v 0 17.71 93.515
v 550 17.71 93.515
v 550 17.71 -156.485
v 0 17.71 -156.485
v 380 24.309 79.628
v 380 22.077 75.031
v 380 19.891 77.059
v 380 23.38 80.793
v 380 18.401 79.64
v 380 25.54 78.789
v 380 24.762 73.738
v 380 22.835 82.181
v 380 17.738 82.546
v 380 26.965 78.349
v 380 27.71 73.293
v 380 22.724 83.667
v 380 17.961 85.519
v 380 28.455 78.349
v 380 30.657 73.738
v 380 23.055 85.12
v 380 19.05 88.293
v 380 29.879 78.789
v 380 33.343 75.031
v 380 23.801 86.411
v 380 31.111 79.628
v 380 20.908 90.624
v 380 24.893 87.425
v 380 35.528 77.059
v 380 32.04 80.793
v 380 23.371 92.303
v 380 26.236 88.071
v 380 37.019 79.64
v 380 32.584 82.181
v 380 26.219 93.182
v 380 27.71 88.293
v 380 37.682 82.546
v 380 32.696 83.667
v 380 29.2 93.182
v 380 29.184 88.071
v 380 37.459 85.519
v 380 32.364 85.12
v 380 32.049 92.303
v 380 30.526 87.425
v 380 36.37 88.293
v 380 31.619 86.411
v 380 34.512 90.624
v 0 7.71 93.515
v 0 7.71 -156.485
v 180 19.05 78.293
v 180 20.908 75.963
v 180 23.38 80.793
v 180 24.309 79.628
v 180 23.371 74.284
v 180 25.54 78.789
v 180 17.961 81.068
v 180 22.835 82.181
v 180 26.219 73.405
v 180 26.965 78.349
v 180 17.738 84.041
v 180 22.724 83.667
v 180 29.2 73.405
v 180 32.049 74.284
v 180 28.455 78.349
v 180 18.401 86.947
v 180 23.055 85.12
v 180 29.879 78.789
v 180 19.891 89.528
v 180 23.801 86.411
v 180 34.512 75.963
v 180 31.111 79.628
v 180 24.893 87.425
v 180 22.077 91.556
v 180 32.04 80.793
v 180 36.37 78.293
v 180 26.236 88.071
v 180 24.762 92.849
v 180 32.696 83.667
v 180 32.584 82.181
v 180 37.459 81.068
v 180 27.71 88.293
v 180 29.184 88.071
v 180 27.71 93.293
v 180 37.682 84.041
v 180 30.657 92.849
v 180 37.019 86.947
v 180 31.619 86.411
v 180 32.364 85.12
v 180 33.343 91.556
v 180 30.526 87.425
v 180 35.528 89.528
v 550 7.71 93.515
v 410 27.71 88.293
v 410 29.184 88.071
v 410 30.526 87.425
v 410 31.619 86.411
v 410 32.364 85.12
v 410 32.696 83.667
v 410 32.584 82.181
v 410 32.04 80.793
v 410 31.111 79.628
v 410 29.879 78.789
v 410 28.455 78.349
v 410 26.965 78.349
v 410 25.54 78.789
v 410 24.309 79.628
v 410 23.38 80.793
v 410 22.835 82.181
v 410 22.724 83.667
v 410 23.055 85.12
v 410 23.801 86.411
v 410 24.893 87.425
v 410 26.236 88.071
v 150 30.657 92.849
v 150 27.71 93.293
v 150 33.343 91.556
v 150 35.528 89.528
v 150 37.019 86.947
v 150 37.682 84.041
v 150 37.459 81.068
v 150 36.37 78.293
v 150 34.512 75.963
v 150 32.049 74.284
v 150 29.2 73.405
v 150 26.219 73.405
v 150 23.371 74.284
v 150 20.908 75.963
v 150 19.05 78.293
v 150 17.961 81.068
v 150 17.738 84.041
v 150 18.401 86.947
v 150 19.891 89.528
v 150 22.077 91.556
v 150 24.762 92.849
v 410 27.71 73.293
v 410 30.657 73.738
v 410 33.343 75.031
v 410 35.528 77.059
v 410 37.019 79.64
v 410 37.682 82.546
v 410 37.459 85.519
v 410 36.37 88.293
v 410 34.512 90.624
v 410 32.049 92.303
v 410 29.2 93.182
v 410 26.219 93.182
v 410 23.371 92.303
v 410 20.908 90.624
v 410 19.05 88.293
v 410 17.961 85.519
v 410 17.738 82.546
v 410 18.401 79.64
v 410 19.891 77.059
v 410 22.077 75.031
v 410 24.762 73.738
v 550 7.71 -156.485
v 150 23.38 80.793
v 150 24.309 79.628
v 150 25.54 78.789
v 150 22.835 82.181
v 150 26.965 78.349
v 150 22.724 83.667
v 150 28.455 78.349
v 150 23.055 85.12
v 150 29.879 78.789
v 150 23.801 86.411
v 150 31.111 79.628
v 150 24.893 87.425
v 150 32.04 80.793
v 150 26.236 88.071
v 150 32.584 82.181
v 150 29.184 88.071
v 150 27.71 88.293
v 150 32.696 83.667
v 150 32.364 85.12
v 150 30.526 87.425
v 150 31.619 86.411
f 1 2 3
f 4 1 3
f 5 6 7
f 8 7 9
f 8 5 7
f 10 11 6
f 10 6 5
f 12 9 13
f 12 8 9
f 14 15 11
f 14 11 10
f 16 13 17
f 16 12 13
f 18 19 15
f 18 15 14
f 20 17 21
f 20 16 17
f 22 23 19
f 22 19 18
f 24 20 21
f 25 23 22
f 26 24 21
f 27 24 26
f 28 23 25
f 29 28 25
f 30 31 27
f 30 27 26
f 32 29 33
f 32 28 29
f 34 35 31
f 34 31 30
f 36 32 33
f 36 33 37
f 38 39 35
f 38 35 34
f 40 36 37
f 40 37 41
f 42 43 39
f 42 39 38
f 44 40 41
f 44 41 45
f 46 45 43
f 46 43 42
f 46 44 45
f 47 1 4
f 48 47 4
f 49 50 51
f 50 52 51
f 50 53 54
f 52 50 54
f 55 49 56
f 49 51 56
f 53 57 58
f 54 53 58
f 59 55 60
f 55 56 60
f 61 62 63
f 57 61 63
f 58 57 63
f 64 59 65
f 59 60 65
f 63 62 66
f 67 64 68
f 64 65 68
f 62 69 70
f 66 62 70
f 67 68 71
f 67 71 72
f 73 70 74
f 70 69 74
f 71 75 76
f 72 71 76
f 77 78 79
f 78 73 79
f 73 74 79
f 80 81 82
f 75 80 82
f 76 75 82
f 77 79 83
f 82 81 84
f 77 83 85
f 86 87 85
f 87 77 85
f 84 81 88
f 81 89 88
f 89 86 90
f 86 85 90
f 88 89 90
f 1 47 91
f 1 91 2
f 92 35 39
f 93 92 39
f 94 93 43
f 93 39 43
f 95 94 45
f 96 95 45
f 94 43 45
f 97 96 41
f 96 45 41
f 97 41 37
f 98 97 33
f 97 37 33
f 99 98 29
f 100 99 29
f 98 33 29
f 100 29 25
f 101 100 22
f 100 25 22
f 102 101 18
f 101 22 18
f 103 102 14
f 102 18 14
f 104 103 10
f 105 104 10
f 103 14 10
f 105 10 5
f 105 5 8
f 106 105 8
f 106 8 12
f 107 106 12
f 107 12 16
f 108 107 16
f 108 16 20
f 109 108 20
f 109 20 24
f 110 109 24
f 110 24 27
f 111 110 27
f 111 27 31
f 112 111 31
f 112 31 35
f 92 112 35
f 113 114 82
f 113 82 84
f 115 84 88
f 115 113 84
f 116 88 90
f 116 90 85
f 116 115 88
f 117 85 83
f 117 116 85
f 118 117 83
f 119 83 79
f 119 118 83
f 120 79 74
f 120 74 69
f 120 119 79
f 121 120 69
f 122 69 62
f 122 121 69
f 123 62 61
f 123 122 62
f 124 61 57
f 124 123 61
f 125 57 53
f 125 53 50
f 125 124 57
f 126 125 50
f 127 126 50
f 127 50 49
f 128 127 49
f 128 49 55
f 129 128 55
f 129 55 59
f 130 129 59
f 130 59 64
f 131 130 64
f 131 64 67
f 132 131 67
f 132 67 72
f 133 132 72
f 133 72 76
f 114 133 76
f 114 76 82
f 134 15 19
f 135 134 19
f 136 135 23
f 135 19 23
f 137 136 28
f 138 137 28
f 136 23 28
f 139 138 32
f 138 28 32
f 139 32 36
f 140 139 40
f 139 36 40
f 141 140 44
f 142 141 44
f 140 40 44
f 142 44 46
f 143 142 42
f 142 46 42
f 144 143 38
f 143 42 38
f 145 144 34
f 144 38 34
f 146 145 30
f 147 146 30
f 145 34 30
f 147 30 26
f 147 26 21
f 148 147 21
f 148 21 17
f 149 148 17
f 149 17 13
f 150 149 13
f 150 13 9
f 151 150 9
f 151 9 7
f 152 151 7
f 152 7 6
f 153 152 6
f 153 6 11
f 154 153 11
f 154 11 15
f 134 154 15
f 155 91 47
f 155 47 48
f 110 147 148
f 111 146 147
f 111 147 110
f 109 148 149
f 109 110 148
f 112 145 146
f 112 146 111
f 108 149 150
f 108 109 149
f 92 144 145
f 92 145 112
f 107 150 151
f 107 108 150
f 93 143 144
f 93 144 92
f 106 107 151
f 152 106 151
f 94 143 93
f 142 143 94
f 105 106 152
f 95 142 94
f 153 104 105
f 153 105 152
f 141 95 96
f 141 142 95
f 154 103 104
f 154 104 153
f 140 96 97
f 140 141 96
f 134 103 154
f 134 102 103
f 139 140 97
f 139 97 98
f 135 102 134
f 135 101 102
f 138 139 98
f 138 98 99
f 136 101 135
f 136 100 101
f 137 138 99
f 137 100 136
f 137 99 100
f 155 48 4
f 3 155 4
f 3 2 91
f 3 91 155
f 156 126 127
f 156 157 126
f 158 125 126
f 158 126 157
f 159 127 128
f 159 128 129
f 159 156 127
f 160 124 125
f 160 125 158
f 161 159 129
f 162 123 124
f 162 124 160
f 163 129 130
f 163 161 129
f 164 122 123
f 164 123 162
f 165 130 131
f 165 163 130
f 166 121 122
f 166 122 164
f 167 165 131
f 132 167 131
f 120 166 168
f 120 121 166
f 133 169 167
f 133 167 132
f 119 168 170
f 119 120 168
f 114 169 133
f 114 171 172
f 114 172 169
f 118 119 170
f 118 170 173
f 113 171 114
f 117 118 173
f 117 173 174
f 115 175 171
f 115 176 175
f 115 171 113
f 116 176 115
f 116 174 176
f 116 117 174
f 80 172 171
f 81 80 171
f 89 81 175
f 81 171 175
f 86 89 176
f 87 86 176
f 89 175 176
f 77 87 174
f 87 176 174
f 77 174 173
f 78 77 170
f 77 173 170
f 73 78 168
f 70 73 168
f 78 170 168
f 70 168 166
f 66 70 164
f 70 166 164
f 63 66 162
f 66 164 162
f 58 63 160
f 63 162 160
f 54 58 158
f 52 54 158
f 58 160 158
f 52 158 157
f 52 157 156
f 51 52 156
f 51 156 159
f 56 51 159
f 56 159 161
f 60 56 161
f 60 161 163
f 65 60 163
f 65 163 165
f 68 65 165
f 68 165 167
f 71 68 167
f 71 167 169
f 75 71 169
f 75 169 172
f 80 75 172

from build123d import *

# Parameters (mm, degrees)
SKETCH1_R             = 10
BOSS_EXTRUDE3_DEPTH   = 550
SKETCH1_W             = 250
SKETCH1_H             = 10
BOSS_EXTRUDE3_2_DEPTH = 550
CUT_EXTRUDE3_START    = -140
SKETCH5_R             = 10
CUT_EXTRUDE3_DEPTH    = 140
SKETCH6_R             = 10
CUT_EXTRUDE4_DEPTH    = 380
SKETCH7_R             = 5
CUT_EXTRUDE5_DEPTH    = 380
SKETCH8_R             = 10
BOSS_EXTRUDE5_DEPTH   = 180
SKETCH10_R            = 10
CUT_EXTRUDE6_DEPTH    = 150
SKETCH11_R            = 5
CUT_EXTRUDE7_DEPTH    = 150


with BuildPart() as part:
    # Sketch1 → Boss-Extrude3 (new body)
    with BuildSketch(Plane(origin=(0, 0, 0), x_dir=(0, 0, -1), z_dir=(1, 0, 0))):
        with Locations((-83.293495175, 27.709808525)):
            Circle(SKETCH1_R)
    extrude(amount=BOSS_EXTRUDE3_DEPTH)

    # Sketch5 → Cut-Extrude3 (cut)
    with BuildSketch(Plane(origin=(550, 0, 0), x_dir=(0, 0, -1), z_dir=(1, 0, 0)).offset(CUT_EXTRUDE3_START)):
        with Locations((-83.293495175, 27.709808525)):
            Circle(SKETCH5_R)
    extrude(amount=CUT_EXTRUDE3_DEPTH, mode=Mode.SUBTRACT)

    # Sketch6 → Cut-Extrude4 (cut)
    with BuildSketch(Plane.ZY):
        with Locations((83.293495175, 27.709808525)):
            Circle(SKETCH6_R)
    extrude(amount=-CUT_EXTRUDE4_DEPTH, mode=Mode.SUBTRACT)

    # Sketch7 → Cut-Extrude5 (cut)
    with BuildSketch(Plane.ZY.offset(-380)):
        with Locations((83.293495175, 27.709808525)):
            Circle(SKETCH7_R)
    extrude(amount=-CUT_EXTRUDE5_DEPTH, mode=Mode.SUBTRACT)


with BuildPart() as body_2:
    # Sketch1 → Boss-Extrude3 2 (new body)
    with BuildSketch(Plane(origin=(0, 0, 0), x_dir=(0, 0, -1), z_dir=(1, 0, 0))):
        with Locations((31.484962406, 12.709808525)):
            Rectangle(SKETCH1_W, SKETCH1_H)
    extrude(amount=BOSS_EXTRUDE3_2_DEPTH)


with BuildPart() as body_3:
    # Sketch8 → Boss-Extrude5 (new body)
    with BuildSketch(Plane.ZY):
        with Locations((83.293495175, 27.709808525)):
            Circle(SKETCH8_R)
    extrude(amount=-BOSS_EXTRUDE5_DEPTH)

    # Sketch10 → Cut-Extrude6 (cut)
    with BuildSketch(Plane.ZY):
        with Locations((83.293495175, 27.709808525)):
            Circle(SKETCH10_R)
    extrude(amount=-CUT_EXTRUDE6_DEPTH, mode=Mode.SUBTRACT)

    # Sketch11 → Cut-Extrude7 (cut)
    with BuildSketch(Plane.ZY.offset(-150)):
        with Locations((83.293495175, 27.709808525)):
            Circle(SKETCH11_R)
    extrude(amount=-CUT_EXTRUDE7_DEPTH, mode=Mode.SUBTRACT)


solid = Compound([part.part, body_2.part, body_3.part])
